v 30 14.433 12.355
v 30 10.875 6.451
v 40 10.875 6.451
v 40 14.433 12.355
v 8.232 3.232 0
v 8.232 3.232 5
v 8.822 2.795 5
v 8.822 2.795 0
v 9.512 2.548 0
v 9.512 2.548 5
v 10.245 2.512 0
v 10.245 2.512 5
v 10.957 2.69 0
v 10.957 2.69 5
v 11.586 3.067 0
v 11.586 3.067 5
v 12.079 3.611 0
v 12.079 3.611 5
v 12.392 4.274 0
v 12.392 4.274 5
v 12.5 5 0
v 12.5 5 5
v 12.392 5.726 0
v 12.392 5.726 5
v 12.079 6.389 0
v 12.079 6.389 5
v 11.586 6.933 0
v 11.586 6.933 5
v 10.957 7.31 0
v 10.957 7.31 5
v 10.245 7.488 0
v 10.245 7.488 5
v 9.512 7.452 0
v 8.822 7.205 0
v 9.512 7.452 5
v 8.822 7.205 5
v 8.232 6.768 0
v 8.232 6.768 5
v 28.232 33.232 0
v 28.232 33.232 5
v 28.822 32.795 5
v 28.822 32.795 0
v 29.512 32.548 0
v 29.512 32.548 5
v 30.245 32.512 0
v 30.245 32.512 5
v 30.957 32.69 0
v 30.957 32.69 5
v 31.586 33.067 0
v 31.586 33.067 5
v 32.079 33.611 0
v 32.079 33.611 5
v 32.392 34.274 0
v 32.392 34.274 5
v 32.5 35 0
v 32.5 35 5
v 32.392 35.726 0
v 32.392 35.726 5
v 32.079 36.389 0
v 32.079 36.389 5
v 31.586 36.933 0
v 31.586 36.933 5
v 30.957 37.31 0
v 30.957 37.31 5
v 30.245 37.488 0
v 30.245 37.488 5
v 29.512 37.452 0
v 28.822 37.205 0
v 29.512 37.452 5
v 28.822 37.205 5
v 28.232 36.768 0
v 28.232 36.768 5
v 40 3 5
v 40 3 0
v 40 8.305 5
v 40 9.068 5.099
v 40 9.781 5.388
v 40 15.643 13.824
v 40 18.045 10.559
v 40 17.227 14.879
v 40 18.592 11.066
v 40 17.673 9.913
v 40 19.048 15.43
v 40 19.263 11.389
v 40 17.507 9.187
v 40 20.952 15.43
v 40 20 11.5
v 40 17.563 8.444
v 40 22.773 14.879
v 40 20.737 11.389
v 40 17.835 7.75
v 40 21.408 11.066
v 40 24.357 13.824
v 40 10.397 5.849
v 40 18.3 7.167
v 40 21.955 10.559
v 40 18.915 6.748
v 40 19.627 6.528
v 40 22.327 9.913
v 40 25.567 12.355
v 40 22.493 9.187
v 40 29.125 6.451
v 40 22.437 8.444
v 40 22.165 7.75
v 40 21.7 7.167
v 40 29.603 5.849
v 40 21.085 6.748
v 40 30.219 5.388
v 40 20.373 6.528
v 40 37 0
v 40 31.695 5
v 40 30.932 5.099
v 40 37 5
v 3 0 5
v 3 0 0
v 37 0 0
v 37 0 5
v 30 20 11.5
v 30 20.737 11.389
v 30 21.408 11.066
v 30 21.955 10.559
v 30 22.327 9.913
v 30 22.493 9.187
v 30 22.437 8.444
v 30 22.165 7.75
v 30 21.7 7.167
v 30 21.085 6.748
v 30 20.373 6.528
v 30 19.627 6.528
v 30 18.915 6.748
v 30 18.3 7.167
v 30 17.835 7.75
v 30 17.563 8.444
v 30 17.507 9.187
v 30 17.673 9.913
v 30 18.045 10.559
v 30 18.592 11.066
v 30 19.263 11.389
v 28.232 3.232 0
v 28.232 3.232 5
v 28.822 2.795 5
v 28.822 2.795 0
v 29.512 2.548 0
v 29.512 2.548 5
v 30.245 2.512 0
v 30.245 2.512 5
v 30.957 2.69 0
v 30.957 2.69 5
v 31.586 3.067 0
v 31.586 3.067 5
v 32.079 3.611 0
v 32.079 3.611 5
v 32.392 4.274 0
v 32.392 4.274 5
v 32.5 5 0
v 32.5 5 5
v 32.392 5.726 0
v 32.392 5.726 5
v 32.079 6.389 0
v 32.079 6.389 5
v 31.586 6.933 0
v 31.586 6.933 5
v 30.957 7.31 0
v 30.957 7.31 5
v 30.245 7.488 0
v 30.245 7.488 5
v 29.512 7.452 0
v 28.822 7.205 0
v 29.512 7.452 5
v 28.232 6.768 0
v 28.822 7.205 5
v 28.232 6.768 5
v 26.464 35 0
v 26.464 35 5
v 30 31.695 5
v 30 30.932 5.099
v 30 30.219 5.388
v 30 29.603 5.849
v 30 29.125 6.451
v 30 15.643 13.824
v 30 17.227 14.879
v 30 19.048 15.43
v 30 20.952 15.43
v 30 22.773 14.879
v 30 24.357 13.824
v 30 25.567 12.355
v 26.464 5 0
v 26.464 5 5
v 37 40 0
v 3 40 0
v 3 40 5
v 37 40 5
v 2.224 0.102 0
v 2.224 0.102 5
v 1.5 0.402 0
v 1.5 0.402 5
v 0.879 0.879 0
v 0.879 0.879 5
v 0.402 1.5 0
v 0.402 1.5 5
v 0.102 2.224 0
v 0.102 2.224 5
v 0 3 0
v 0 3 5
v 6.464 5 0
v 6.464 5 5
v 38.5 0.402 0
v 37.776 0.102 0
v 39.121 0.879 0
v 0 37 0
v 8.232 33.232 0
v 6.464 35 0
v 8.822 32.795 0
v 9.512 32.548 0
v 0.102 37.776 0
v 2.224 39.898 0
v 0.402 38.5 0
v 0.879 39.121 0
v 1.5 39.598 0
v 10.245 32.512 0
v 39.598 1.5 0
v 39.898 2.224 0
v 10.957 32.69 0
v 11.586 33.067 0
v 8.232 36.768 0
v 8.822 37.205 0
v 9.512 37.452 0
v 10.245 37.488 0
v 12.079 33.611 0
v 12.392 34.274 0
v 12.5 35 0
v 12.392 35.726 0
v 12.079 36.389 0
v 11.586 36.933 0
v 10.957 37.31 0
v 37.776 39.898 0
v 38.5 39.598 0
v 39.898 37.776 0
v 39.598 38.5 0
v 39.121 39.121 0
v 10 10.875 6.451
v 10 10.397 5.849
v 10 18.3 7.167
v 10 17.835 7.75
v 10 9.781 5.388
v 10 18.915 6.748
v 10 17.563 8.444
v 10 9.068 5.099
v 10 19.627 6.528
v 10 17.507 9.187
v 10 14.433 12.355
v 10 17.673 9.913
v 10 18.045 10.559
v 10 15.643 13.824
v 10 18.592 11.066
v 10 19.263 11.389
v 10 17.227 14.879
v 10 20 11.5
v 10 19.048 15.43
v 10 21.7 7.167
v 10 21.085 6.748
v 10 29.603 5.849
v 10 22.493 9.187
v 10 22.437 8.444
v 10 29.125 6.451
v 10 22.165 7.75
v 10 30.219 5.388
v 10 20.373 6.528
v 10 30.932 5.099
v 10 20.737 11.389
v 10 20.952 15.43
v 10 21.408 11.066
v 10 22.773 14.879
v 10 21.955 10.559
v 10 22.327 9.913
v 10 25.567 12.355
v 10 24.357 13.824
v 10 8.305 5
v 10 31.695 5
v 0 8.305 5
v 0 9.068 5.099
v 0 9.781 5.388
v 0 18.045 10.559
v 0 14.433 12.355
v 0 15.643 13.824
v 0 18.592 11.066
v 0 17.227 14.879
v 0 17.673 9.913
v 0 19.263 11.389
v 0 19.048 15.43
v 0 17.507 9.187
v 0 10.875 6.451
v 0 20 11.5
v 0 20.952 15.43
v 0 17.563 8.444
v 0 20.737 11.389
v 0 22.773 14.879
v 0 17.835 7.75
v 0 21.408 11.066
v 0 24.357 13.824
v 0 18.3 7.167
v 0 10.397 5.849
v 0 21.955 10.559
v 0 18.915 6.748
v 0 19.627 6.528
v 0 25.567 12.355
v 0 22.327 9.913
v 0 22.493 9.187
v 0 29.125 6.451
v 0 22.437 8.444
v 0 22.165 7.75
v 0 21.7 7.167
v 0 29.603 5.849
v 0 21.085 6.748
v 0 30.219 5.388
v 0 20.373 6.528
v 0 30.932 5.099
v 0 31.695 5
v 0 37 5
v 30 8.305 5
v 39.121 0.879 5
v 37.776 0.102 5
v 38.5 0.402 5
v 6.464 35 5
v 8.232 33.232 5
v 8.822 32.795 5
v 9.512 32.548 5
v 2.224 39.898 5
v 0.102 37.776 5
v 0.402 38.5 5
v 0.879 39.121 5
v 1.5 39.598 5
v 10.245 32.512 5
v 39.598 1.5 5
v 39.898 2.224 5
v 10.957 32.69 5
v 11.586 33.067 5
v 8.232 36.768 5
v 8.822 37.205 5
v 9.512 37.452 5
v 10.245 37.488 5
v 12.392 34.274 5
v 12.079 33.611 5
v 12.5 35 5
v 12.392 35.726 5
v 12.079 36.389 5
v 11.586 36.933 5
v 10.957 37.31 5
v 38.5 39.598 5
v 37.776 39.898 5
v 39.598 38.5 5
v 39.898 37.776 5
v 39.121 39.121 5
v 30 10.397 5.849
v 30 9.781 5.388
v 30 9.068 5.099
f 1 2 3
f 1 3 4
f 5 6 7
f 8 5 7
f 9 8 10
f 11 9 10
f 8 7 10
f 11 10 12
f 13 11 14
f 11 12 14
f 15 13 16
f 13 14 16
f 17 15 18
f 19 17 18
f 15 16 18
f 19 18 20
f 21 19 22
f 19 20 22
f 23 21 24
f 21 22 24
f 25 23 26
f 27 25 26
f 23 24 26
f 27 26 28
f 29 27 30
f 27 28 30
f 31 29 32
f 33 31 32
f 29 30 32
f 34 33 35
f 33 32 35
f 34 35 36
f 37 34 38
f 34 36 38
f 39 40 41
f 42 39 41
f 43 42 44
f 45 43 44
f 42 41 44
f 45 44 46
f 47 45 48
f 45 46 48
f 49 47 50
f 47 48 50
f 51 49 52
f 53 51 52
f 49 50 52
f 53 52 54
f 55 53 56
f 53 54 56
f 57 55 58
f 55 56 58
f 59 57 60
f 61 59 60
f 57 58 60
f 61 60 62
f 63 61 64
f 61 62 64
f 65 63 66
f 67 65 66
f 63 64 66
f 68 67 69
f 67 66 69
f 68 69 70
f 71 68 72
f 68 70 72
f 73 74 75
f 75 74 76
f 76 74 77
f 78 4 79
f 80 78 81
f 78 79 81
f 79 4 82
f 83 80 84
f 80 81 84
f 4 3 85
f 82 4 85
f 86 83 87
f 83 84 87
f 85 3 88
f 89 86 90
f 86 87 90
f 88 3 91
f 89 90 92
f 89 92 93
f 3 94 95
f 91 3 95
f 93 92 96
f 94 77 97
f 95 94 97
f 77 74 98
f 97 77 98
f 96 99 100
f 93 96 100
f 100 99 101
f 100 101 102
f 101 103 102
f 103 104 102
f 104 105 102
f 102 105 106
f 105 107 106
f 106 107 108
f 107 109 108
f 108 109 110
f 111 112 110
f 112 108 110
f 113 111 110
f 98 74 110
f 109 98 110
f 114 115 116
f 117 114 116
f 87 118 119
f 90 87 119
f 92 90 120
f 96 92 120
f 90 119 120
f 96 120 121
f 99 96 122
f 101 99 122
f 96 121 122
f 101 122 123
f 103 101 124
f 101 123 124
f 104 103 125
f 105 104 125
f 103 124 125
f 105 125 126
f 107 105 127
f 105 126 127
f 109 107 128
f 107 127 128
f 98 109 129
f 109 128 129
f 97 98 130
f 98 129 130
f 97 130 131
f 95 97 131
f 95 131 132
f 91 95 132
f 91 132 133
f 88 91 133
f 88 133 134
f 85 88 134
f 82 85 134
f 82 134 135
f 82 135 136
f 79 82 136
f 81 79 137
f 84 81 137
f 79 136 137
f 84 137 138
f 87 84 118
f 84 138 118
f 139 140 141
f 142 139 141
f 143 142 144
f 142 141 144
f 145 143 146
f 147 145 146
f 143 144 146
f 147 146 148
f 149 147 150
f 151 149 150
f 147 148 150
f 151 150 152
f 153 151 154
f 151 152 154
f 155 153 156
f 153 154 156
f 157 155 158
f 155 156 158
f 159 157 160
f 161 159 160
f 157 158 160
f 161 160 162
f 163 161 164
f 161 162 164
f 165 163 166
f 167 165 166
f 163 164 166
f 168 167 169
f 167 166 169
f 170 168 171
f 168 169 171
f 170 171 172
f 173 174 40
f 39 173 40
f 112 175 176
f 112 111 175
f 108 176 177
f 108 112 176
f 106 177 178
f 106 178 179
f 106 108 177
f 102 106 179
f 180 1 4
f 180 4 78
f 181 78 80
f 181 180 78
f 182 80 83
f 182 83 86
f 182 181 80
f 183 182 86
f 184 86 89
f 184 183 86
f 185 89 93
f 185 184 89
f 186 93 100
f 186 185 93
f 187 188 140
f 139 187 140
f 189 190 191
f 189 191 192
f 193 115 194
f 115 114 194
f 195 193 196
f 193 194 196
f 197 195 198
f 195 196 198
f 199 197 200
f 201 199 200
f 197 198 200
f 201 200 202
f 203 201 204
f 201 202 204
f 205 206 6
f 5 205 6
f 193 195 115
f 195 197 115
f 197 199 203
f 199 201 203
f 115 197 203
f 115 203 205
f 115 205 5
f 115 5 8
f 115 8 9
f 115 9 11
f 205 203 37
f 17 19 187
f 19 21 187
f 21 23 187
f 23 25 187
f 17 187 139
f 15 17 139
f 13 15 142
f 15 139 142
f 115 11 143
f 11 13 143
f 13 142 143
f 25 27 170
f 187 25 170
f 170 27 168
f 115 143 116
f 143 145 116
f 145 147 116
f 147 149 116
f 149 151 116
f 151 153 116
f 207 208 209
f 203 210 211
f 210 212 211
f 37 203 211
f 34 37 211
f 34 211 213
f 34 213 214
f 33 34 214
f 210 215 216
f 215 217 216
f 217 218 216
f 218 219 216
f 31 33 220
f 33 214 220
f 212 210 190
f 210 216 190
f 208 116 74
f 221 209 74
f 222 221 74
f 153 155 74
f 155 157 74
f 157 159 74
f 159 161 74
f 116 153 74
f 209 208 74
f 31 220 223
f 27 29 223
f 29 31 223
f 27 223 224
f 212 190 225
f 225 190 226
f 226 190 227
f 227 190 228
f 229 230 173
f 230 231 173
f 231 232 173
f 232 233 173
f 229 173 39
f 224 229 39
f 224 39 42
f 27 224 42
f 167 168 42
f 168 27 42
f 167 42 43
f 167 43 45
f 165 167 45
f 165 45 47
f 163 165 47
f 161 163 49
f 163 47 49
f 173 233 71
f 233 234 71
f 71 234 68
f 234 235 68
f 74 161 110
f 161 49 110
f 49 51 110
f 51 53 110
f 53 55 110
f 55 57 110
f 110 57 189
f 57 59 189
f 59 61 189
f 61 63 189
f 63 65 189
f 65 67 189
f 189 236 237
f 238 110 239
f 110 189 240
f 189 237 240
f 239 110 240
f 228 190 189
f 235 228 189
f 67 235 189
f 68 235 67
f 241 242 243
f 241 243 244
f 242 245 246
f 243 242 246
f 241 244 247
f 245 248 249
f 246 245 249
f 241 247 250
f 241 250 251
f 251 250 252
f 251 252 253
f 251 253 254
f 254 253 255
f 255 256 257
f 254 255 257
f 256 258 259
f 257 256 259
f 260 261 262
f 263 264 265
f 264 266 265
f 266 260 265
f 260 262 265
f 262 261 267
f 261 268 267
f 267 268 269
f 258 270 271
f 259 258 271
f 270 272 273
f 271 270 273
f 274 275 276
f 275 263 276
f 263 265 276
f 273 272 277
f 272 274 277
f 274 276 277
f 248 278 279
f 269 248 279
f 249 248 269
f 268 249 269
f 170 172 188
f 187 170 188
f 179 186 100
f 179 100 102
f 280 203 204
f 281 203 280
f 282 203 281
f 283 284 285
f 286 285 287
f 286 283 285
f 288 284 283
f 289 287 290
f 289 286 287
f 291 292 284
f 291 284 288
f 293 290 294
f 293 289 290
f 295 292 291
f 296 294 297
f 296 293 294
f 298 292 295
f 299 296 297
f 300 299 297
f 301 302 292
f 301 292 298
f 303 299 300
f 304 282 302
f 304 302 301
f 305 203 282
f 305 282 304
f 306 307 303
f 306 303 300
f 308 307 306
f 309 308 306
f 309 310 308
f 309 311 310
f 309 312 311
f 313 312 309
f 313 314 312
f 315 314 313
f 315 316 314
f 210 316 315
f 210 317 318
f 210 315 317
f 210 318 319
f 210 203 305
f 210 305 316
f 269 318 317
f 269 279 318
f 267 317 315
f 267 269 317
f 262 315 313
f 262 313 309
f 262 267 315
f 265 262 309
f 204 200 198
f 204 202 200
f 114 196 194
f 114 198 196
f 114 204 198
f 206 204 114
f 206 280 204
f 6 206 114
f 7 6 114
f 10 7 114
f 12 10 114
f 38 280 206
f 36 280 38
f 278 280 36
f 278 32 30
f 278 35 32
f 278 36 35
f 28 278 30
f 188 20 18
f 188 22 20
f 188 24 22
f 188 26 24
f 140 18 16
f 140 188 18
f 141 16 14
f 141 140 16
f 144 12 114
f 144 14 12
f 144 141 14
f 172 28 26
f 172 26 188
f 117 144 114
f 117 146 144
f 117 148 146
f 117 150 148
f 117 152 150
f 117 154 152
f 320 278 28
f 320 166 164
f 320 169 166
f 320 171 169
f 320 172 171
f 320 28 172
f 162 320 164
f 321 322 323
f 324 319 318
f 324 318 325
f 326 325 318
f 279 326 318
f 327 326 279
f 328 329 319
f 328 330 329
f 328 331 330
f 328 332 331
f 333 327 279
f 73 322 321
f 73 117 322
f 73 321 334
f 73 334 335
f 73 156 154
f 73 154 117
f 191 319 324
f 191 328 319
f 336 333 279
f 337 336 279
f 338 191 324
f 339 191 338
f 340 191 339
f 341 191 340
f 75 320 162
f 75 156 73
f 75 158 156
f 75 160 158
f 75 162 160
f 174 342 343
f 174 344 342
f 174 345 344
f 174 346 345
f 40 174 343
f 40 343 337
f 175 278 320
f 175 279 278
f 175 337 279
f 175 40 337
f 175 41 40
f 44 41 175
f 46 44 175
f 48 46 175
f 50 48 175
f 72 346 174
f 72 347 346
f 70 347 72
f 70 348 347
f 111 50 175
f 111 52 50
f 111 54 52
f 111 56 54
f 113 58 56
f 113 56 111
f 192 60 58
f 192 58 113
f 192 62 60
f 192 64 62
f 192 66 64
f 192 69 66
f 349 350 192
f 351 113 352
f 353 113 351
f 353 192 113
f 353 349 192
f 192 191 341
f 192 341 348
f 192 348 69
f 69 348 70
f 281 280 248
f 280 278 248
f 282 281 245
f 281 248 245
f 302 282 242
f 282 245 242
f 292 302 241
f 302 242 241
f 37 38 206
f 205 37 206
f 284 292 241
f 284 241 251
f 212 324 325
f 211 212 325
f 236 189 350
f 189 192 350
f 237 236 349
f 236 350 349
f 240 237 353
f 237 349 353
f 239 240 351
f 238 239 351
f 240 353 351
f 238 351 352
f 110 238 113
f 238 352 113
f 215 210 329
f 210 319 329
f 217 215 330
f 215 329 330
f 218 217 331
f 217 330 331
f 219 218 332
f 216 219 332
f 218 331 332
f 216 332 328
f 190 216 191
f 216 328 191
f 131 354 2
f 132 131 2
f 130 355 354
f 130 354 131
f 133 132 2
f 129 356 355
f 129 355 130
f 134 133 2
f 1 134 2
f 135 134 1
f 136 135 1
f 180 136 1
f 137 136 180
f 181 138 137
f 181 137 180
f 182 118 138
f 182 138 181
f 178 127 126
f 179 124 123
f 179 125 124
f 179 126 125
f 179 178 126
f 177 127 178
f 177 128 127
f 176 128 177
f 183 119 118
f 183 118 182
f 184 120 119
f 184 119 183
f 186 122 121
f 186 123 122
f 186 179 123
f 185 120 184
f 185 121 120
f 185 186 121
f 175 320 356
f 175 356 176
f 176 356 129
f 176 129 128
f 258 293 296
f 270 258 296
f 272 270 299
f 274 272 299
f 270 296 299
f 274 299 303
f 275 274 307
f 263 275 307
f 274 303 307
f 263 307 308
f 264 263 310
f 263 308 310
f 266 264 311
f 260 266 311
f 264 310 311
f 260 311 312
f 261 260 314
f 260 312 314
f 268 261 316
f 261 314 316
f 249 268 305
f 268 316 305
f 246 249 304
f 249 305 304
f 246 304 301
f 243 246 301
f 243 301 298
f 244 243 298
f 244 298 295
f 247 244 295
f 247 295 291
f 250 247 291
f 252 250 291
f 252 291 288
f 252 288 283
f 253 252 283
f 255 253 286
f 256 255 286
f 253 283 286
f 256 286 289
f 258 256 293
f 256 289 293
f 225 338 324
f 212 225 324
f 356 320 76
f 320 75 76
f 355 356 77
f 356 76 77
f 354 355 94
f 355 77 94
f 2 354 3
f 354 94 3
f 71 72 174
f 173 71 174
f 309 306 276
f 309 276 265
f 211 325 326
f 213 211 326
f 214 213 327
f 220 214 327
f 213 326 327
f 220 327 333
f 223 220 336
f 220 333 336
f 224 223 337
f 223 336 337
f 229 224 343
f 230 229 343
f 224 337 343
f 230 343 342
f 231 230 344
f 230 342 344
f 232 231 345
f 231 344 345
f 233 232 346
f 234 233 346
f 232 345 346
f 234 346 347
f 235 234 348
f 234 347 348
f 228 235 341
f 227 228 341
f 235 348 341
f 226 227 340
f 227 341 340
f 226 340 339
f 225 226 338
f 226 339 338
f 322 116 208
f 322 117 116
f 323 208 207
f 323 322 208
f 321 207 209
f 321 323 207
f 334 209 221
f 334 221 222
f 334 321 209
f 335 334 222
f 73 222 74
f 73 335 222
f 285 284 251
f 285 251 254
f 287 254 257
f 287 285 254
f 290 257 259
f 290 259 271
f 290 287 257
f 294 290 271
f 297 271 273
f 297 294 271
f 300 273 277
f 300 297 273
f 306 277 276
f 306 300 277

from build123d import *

# Parameters (mm, degrees)
SKETCH1_W              = 40
SKETCH1_H              = 40
BOSS_EXTRUDE1_DEPTH    = 5
CUT_EXTRUDE1_DEPTH     = 57.789083458
SKETCH3_R              = 2.5
BOSS_EXTRUDE2_DEPTH    = 10
FILLET1_R              = 3
LPATTERN1_COUNT        = 2
LPATTERN1_PITCH        = 30
FILLET1_OF_LPATTERN1_R = 3
FILLET2_R              = 3


with BuildPart() as part:
    # Sketch1 → Boss-Extrude1 (new body)
    with BuildSketch(Plane.XY):
        with Locations((20, 20)):
            Rectangle(SKETCH1_W, SKETCH1_H)
    extrude(amount=BOSS_EXTRUDE1_DEPTH)

    # Sketch2 → Cut-Extrude1 (cut, through all)
    with BuildSketch(Plane.XY.offset(5)):
        with BuildLine():
            Line((8.232233047, 36.767766953), (6.464466094, 35))
            Line((6.464466094, 35), (8.232233047, 33.232233047))
            ThreePointArc((8.232233047, 33.232233047), (12.5, 35), (8.232233047, 36.767766953))
        make_face()
        with BuildLine():
            Line((26.464466094, 35), (28.232233047, 33.232233047))
            ThreePointArc((28.232233047, 33.232233047), (32.5, 35), (28.232233047, 36.767766953))
            Line((28.232233047, 36.767766953), (26.464466094, 35))
        make_face()
        with BuildLine():
            Line((26.464466094, 5), (28.232233047, 3.232233047))
            ThreePointArc((28.232233047, 3.232233047), (32.5, 5), (28.232233047, 6.767766953))
            Line((28.232233047, 6.767766953), (26.464466094, 5))
        make_face()
        with BuildLine():
            Line((6.464466094, 5), (8.232233047, 3.232233047))
            ThreePointArc((8.232233047, 3.232233047), (12.5, 5), (8.232233047, 6.767766953))
            Line((8.232233047, 6.767766953), (6.464466094, 5))
        make_face()
    extrude(amount=-CUT_EXTRUDE1_DEPTH, mode=Mode.SUBTRACT)

    # Sketch3 → Boss-Extrude2 (add)
    with BuildSketch(Plane.ZY):
        with BuildLine():
            Line((12.355222683, 25.567089073), (5, 30))
            Line((5, 30), (5, 10))
            Line((5, 10), (12.355222683, 14.432910927))
            ThreePointArc((12.355222683, 14.432910927), (15.5, 20), (12.355222683, 25.567089073))
        make_face()
        with Locations((9, 20)):
            Circle(SKETCH3_R, mode=Mode.SUBTRACT)
    boss_extrude2 = extrude(amount=-BOSS_EXTRUDE2_DEPTH)

    # Fillet1
    fillet1_edges = [part.edges().sort_by_distance(p)[0] for p in [
        (5, 10, 5),
        (5, 30, 5),
    ]]
    fillet(fillet1_edges, radius=FILLET1_R)

    # LPattern1: Boss-Extrude2 ×2
    with Locations(*[(i * LPATTERN1_PITCH, 0, 0) for i in range(1, LPATTERN1_COUNT)]):
        add(boss_extrude2)

    # Fillet1 of LPattern1
    fillet1_of_lpattern1_edges = [part.edges().sort_by_distance(p)[0] for p in [
        (35, 10, 5),
        (35, 30, 5),
    ]]
    fillet(fillet1_of_lpattern1_edges, radius=FILLET1_OF_LPATTERN1_R)

    # Fillet2
    fillet2_edges = [part.edges().sort_by_distance(p)[0] for p in [
        (0, 40, 2.5),
        (40, 40, 2.5),
        (40, 0, 2.5),
        (0, 0, 2.5),
    ]]
    fillet(fillet2_edges, radius=FILLET2_R)


solid = part.part
